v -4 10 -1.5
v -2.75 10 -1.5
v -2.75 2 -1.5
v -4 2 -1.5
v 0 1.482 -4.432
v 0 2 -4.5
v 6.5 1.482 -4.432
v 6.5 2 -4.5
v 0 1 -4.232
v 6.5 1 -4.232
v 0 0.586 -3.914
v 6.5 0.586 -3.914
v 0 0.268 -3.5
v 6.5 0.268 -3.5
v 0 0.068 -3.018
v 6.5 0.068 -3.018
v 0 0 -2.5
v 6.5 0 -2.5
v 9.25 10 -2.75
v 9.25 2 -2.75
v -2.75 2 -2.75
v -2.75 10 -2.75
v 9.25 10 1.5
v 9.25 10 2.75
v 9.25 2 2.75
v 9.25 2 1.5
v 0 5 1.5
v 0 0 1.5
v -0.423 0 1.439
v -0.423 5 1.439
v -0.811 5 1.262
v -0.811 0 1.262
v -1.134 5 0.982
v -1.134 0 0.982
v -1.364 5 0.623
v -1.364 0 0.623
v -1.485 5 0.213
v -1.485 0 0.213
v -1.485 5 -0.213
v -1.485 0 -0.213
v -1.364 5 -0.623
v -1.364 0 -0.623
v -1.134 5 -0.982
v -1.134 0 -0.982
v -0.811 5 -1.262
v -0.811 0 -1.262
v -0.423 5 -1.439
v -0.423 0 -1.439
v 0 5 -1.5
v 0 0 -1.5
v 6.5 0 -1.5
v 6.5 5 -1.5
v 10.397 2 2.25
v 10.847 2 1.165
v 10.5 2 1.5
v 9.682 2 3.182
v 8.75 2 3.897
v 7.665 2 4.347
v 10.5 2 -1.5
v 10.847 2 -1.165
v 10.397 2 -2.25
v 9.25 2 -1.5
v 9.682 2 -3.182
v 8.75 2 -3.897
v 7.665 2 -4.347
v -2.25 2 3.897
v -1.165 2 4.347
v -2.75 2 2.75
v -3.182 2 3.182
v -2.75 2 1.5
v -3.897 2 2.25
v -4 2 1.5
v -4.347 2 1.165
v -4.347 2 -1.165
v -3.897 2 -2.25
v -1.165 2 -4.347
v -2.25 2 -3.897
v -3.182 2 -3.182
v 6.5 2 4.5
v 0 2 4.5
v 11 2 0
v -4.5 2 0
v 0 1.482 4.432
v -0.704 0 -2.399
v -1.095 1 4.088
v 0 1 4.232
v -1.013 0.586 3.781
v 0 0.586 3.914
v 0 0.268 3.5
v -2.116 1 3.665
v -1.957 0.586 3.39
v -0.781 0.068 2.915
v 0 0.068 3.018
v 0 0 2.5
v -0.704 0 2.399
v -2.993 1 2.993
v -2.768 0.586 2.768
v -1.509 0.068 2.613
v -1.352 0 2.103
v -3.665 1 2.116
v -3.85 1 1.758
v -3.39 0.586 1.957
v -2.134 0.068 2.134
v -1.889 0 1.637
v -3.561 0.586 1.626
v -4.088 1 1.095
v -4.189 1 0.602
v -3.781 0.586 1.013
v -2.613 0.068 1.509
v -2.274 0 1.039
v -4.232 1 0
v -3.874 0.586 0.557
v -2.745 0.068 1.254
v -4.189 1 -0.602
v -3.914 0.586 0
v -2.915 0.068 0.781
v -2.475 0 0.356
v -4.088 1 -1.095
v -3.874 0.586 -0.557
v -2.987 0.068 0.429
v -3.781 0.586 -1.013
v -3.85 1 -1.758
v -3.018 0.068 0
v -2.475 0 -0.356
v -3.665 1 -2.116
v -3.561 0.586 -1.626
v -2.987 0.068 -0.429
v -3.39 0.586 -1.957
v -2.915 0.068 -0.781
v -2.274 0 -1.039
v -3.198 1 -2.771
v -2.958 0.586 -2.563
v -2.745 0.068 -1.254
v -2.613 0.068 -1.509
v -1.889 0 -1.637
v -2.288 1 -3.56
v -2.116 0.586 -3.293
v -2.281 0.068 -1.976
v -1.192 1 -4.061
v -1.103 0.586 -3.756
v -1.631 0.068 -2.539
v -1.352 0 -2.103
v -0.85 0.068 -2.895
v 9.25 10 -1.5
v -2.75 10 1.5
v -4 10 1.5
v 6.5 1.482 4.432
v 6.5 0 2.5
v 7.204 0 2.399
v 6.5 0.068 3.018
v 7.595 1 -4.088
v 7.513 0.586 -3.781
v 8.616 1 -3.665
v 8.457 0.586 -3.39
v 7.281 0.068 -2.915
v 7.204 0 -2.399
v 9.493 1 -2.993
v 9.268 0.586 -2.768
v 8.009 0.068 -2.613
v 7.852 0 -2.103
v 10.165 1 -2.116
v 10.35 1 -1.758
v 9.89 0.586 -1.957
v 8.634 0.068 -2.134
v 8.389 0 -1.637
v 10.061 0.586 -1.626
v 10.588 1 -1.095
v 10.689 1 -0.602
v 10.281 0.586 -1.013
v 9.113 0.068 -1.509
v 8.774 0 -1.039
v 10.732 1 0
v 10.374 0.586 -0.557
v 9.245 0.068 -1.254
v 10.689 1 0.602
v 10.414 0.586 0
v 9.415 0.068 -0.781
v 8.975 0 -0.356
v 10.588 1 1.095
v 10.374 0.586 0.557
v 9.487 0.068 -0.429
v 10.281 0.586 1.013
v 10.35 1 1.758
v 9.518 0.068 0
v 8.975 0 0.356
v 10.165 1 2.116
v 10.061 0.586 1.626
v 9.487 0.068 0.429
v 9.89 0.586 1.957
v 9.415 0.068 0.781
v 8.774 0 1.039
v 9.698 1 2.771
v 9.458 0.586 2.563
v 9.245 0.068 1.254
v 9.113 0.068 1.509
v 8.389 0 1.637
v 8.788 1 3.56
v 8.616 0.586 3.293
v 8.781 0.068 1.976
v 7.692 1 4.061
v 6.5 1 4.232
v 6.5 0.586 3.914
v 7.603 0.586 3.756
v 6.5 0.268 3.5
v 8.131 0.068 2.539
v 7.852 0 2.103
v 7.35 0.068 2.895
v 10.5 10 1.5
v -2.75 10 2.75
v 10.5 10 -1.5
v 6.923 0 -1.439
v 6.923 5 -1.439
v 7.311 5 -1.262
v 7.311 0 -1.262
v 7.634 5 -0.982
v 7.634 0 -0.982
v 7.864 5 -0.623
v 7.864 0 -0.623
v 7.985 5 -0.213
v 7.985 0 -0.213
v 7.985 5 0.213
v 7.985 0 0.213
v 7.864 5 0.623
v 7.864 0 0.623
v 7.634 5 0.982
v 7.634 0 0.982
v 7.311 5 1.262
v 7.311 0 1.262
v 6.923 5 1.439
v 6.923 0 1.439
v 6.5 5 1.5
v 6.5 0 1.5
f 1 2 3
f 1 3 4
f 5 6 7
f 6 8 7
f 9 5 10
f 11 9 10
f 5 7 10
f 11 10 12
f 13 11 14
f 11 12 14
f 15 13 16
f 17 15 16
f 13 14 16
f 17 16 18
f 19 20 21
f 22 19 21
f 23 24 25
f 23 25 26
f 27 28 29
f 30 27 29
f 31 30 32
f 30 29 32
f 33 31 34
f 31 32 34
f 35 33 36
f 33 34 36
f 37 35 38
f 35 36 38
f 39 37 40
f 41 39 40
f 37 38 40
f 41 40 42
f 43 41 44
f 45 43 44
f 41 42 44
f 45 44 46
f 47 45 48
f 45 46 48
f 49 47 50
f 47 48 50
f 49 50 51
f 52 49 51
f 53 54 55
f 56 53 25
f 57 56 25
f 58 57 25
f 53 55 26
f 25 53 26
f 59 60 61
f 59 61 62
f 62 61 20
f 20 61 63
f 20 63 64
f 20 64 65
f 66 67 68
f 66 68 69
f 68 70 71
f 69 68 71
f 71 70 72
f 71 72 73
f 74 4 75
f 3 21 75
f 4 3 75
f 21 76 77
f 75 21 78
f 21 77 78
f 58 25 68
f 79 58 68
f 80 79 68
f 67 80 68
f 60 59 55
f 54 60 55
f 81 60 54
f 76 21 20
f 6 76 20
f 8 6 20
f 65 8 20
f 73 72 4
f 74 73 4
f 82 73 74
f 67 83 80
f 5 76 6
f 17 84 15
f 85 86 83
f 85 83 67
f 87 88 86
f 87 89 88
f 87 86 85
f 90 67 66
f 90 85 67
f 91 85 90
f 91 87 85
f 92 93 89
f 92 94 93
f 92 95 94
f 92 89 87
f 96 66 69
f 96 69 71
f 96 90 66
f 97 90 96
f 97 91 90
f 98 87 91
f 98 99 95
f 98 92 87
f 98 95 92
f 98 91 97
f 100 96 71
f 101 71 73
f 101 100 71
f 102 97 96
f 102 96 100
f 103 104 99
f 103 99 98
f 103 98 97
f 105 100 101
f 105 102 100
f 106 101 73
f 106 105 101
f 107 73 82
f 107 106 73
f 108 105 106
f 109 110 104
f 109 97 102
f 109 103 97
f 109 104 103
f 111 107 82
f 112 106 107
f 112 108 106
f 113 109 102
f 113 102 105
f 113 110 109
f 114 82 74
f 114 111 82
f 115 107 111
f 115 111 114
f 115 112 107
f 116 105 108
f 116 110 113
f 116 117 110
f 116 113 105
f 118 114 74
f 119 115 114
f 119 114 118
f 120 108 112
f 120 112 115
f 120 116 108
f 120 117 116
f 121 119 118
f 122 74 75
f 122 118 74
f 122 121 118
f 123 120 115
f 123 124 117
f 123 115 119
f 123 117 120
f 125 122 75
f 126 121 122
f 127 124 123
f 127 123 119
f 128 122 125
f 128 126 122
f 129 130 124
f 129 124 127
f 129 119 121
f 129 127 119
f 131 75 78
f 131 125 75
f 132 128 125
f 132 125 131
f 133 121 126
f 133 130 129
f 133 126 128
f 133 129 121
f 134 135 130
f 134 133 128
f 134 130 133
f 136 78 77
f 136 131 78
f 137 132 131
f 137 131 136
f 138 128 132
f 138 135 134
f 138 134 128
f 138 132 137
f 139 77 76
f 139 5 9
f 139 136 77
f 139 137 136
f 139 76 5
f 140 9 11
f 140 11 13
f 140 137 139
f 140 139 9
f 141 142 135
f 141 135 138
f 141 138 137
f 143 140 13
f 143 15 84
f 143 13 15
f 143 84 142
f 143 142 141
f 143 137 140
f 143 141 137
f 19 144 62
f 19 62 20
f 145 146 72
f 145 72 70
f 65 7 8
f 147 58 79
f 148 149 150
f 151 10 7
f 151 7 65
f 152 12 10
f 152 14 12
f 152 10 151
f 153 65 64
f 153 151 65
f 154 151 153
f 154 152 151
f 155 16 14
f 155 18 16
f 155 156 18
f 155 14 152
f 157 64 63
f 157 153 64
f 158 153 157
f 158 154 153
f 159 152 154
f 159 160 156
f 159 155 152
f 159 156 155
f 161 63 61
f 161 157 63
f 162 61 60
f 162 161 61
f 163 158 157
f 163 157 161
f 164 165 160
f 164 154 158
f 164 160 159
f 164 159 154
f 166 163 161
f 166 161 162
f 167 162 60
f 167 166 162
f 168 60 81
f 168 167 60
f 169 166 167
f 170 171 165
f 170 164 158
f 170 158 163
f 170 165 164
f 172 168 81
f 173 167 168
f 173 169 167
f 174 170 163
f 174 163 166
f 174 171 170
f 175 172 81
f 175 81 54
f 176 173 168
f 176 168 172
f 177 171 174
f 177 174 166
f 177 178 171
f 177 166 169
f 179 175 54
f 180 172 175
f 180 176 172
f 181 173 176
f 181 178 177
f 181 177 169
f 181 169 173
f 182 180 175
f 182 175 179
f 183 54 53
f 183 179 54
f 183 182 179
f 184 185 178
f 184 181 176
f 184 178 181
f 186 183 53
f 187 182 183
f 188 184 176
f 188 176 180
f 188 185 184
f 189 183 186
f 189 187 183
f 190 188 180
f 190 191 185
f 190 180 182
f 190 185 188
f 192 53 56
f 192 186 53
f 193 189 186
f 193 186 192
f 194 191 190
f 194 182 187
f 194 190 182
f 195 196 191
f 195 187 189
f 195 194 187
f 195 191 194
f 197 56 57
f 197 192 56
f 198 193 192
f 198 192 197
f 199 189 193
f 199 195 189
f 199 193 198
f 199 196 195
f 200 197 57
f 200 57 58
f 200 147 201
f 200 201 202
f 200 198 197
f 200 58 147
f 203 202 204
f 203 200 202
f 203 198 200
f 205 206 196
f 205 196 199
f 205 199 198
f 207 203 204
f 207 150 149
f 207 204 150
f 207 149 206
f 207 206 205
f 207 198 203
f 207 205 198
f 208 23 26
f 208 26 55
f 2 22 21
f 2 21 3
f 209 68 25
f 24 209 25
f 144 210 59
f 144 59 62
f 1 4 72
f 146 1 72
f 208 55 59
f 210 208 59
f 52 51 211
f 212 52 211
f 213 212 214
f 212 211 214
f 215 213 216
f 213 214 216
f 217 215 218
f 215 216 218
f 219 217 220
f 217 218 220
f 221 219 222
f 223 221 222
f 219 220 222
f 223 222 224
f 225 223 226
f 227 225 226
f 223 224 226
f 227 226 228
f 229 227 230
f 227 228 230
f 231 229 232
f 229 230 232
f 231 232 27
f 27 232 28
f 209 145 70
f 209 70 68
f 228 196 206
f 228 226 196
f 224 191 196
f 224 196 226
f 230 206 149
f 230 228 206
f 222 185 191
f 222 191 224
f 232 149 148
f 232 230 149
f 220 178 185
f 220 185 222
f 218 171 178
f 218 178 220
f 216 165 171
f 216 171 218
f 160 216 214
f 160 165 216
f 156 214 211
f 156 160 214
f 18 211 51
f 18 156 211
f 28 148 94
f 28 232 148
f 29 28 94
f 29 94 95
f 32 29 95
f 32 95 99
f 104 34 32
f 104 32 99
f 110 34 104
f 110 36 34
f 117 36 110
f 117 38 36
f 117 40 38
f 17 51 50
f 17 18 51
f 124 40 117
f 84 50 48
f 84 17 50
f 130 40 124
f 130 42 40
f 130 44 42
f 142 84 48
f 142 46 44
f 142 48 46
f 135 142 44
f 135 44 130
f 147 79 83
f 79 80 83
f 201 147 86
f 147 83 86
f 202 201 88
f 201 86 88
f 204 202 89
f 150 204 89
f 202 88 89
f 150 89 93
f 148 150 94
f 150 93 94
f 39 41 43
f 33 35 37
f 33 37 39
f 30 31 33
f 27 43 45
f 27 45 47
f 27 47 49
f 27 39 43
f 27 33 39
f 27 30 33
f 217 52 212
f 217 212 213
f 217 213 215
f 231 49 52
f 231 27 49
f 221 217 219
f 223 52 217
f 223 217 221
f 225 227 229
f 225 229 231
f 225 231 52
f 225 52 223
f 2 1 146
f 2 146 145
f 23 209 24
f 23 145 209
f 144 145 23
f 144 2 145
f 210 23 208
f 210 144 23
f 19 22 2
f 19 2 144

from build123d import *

# Parameters (mm, degrees)
BOSS_EXTRU_1_DEPTH      = 2
CONG_1_R                = 2
BOSS_EXTRU_2_DEPTH      = 8
ENL_V_MAT_EXTRU_1_DEPTH = 5


with BuildPart() as part:
    # Esquisse1 → Boss.-Extru.1 (new body)
    with BuildSketch(Plane(origin=(0, 0, 0), x_dir=(1, 0, 0), z_dir=(0, 1, 0))):
        with BuildLine():
            Line((0, 4.5), (6.5, 4.5))
            ThreePointArc((6.5, 4.5), (11, 0), (6.5, -4.5))
            Line((6.5, -4.5), (0, -4.5))
            ThreePointArc((0, -4.5), (-4.5, 0), (0, 4.5))
        make_face()
    extrude(amount=BOSS_EXTRU_1_DEPTH)

    # Congé1
    cong_1_edges = [part.edges().sort_by_distance(p)[0] for p in [
        (3.25, 0, -4.5),
        (11, 0, 0),
        (-4.5, 0, 0),
        (3.25, 0, 4.5),
    ]]
    fillet(cong_1_edges, radius=CONG_1_R - 0.0001)  # a hair under: the kernel refuses the full size

    # Esquisse2 → Boss.-Extru.2 (add)
    with BuildSketch(Plane(origin=(0, 2, 0), x_dir=(1, 0, 0), z_dir=(0, 1, 0))):
        Polygon((-2.75, -2.75), (9.25, -2.75), (9.25, -1.5), (10.5, -1.5), (10.5, 1.5), (9.25, 1.5), (9.25, 2.75), (-2.75, 2.75), (-2.75, 1.5), (-4, 1.5), (-4, -1.5), (-2.75, -1.5), align=None)
    extrude(amount=BOSS_EXTRU_2_DEPTH)

    # Esquisse4 → Enlèv. mat.-Extru.1 (cut)
    with BuildSketch(Plane.XZ):
        with BuildLine():
            Line((6.5, 1.5), (0, 1.5))
            ThreePointArc((0, 1.5), (-1.5, 0), (0, -1.5))
            Line((0, -1.5), (6.5, -1.5))
            ThreePointArc((6.5, -1.5), (8, 0), (6.5, 1.5))
        make_face()
    extrude(amount=-ENL_V_MAT_EXTRU_1_DEPTH, mode=Mode.SUBTRACT)


solid = part.part
